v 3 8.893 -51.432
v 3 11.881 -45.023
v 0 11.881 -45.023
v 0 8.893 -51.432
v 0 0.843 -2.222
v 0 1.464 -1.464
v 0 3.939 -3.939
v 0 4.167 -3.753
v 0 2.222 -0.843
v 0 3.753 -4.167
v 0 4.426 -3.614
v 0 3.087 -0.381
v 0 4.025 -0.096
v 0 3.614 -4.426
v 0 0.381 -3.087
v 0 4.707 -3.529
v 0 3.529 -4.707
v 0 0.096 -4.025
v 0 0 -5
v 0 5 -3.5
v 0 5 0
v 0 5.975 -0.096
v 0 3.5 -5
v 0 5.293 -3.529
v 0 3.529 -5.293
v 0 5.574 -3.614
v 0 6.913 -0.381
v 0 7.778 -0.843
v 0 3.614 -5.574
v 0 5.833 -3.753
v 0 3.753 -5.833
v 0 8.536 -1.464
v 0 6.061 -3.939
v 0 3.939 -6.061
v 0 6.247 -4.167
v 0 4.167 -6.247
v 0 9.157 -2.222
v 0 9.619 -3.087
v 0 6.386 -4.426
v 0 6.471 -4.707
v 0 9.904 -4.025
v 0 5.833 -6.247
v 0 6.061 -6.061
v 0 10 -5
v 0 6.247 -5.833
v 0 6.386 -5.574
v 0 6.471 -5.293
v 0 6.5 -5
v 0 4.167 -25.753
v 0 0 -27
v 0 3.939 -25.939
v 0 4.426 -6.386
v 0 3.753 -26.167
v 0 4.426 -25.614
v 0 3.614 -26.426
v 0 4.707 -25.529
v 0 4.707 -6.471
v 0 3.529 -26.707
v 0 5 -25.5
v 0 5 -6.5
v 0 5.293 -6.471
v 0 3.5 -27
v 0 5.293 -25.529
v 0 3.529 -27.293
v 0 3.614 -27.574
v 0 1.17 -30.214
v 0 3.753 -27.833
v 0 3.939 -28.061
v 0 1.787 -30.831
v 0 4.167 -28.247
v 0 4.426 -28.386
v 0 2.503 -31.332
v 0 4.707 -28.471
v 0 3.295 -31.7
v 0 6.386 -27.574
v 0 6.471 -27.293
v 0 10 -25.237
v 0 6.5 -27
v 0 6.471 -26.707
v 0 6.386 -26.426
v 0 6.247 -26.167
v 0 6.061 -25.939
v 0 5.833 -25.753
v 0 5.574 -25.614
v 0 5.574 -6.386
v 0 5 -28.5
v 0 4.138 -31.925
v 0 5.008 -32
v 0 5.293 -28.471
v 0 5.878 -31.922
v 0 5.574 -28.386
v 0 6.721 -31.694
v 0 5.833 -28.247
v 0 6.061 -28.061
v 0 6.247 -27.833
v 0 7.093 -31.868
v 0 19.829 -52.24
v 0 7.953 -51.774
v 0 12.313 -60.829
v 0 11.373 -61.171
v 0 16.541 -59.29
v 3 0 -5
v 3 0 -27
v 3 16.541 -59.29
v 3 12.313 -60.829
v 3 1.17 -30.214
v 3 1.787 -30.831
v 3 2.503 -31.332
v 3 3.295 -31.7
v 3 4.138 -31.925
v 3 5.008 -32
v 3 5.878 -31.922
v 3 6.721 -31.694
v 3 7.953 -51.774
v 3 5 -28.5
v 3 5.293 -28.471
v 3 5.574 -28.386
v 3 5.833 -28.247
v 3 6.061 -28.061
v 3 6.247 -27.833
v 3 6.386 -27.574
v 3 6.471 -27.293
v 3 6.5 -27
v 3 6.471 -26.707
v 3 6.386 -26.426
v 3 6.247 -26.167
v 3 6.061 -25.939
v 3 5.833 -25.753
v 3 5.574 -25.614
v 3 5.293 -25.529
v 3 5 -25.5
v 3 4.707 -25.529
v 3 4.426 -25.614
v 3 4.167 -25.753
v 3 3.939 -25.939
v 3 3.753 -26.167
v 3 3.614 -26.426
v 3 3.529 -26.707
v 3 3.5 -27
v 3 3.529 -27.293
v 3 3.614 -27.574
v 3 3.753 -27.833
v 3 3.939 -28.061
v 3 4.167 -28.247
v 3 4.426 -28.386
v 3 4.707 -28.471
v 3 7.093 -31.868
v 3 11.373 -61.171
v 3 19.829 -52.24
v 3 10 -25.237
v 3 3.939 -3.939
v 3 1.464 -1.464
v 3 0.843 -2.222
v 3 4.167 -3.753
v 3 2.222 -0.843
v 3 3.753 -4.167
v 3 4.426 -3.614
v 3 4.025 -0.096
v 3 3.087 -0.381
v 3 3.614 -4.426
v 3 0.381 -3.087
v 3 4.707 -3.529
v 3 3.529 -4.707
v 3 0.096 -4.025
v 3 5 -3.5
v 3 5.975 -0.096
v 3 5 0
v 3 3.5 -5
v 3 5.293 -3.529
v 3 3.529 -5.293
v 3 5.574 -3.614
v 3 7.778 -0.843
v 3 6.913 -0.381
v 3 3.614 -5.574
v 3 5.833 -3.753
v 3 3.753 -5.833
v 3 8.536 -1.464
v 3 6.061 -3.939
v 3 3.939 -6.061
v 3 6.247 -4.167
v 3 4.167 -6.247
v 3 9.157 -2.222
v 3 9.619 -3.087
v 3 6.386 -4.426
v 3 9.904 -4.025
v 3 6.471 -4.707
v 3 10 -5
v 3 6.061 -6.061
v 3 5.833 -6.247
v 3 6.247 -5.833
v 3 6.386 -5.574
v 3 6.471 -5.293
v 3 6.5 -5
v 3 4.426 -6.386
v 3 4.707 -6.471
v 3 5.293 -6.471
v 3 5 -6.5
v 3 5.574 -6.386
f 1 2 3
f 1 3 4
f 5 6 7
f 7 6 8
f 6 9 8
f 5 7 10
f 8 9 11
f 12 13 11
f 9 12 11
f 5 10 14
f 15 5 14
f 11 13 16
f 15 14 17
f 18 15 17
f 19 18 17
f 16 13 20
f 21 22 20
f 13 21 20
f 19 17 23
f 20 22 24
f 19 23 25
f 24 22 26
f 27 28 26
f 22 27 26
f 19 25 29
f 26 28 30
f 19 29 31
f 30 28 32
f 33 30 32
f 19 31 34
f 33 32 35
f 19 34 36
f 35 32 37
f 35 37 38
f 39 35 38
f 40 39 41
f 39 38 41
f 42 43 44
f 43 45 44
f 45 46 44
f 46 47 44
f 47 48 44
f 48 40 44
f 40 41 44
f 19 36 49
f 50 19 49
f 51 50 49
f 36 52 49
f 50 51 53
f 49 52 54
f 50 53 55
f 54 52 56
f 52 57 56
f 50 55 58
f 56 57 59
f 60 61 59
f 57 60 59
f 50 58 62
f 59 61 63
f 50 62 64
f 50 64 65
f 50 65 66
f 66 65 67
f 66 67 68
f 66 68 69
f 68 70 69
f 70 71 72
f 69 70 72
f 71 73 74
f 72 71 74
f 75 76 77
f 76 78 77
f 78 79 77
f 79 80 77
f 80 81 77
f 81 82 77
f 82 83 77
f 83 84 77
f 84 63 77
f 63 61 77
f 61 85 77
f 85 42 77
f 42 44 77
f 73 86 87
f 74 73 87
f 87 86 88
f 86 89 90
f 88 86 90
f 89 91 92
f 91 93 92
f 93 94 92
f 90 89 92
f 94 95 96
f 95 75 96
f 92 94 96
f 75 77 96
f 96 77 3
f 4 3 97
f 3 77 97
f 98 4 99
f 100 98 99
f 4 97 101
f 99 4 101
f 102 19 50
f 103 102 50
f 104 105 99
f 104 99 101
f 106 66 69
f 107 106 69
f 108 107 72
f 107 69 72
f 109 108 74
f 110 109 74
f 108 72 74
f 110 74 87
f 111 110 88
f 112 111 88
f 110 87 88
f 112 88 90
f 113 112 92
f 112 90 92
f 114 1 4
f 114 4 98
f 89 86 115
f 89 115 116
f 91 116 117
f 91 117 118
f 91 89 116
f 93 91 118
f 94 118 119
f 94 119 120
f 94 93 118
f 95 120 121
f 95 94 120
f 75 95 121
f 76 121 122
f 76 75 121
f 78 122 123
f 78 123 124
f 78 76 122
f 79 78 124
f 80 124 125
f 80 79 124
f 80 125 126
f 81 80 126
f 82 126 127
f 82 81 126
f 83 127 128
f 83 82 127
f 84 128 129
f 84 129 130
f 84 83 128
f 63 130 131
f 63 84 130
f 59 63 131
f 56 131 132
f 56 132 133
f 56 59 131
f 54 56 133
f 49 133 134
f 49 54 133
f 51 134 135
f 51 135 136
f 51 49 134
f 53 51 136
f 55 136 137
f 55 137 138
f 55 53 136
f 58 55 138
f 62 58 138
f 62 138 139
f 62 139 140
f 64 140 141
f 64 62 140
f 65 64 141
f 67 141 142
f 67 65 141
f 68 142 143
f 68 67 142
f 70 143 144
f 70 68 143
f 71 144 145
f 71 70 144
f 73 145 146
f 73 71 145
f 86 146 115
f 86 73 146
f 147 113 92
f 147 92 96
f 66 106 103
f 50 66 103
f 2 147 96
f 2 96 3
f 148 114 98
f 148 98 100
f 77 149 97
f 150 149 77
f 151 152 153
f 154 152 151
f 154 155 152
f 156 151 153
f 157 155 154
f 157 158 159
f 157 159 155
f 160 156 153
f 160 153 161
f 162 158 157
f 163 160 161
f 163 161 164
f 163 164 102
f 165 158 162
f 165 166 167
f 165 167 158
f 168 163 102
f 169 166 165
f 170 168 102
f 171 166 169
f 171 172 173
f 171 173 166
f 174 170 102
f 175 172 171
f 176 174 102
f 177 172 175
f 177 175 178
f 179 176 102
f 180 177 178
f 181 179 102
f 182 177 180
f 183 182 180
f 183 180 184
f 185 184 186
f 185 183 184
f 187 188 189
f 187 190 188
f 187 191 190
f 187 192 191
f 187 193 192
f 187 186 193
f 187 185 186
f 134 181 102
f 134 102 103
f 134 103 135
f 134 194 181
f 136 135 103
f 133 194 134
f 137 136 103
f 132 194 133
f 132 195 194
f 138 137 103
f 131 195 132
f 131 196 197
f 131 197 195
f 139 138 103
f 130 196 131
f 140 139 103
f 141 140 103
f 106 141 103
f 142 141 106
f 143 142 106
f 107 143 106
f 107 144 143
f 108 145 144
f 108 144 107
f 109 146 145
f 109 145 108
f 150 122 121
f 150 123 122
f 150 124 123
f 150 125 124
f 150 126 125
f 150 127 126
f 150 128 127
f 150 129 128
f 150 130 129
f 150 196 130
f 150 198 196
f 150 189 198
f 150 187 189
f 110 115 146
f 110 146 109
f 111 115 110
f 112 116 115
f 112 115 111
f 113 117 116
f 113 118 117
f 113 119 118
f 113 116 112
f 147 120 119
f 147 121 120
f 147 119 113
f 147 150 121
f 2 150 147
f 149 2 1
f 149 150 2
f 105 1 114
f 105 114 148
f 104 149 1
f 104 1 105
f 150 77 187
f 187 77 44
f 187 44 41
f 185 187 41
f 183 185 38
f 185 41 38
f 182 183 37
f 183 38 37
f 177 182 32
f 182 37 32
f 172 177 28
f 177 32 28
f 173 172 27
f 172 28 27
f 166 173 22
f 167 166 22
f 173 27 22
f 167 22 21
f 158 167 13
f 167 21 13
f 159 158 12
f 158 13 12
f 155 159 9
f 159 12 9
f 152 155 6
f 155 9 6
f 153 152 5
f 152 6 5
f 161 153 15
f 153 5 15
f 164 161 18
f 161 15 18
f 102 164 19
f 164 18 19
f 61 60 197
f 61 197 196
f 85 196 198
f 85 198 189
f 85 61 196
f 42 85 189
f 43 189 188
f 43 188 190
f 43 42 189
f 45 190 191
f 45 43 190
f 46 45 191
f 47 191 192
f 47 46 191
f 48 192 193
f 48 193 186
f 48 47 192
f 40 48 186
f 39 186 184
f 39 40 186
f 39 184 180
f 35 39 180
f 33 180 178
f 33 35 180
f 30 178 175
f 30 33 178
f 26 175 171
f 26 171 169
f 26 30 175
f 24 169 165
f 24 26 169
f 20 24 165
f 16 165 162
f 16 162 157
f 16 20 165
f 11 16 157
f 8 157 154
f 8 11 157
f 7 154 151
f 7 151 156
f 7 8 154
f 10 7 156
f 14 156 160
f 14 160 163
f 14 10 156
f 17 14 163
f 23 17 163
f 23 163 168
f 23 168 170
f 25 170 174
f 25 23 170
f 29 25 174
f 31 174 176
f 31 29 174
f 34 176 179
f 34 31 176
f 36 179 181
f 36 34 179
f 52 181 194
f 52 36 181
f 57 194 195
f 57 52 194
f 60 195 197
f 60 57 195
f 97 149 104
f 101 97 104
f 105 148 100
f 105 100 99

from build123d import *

# Parameters (mm, degrees)
SKETCH1_R           = 5
SKETCH1_R_2         = 1.5
BOSS_EXTRUDE1_DEPTH = 3
BOSS_EXTRUDE2_DEPTH = 3
CUT_EXTRUDE1_DEPTH  = 3
CUT_EXTRUDE2_DEPTH  = 4


with BuildPart() as part:
    # Sketch1 → Boss-Extrude1 (new body)
    with BuildSketch(Plane(origin=(0, 0, 0), x_dir=(0, 0, -1), z_dir=(1, 0, 0))):
        with Locations((5, 5)):
            Circle(SKETCH1_R)
        with Locations((5, 5)):
            Circle(SKETCH1_R_2, mode=Mode.SUBTRACT)
        with BuildLine():
            ThreePointArc((10, 5), (8.535533906, 1.464466094), (5, 0))
            Line((5, 0), (27, 0))
            ThreePointArc((27, 0), (22, 5), (27, 10))
            Line((27, 10), (5, 10))
            ThreePointArc((5, 10), (8.535533906, 8.535533906), (10, 5))
        make_face()
        with Locations((27, 5)):
            Circle(SKETCH1_R)
        with Locations((27, 5)):
            Circle(SKETCH1_R_2, mode=Mode.SUBTRACT)
    extrude(amount=BOSS_EXTRUDE1_DEPTH)

    # Sketch2 → Boss-Extrude2 (add)
    with BuildSketch(Plane(origin=(3, 0, 0), x_dir=(0, 0, -1), z_dir=(1, 0, 0))):
        with BuildLine():
            ThreePointArc((27, 10), (29.863119288, 9.099091112), (31.69447473, 6.721019177))
            Line((31.69447473, 6.721019177), (31.867747629, 7.092604107))
            Line((31.867747629, 7.092604107), (45.02344432, 11.880886114))
            Line((45.02344432, 11.880886114), (51.43200814, 8.892523726))
            Line((51.43200814, 8.892523726), (60.828934348, 12.31272516))
            Line((60.828934348, 12.31272516), (57.408732915, 21.709651368))
            Line((57.408732915, 21.709651368), (25.236730193, 10))
            Line((25.236730193, 10), (27, 10))
        make_face()
        Polygon((60.828934348, 12.31272516), (51.43200814, 8.892523726), (51.774028284, 7.952831106), (61.170954492, 11.373032539), align=None)
    extrude(amount=-BOSS_EXTRUDE2_DEPTH)

    # Sketch3 → Cut-Extrude1 (cut)
    with BuildSketch(Plane(origin=(3, 0, 0), x_dir=(0, 0, -1), z_dir=(1, 0, 0))):
        with BuildLine():
            ThreePointArc((27, 0), (28.710100717, 0.301536896), (30.213938048, 1.169777784))
            Line((30.213938048, 1.169777784), (27, 0))
        make_face()
    extrude(amount=-CUT_EXTRUDE1_DEPTH, mode=Mode.SUBTRACT)

    # Sketch4 → Cut-Extrude2 (cut, through all)
    with BuildSketch(Plane(origin=(3, 0, 0), x_dir=(0, 0, -1), z_dir=(1, 0, 0))):
        Polygon((57.408732915, 21.709651368), (52.240423501, 19.828540579), (59.289843703, 16.541341953), align=None)
    extrude(amount=-CUT_EXTRUDE2_DEPTH, mode=Mode.SUBTRACT)


solid = part.part
